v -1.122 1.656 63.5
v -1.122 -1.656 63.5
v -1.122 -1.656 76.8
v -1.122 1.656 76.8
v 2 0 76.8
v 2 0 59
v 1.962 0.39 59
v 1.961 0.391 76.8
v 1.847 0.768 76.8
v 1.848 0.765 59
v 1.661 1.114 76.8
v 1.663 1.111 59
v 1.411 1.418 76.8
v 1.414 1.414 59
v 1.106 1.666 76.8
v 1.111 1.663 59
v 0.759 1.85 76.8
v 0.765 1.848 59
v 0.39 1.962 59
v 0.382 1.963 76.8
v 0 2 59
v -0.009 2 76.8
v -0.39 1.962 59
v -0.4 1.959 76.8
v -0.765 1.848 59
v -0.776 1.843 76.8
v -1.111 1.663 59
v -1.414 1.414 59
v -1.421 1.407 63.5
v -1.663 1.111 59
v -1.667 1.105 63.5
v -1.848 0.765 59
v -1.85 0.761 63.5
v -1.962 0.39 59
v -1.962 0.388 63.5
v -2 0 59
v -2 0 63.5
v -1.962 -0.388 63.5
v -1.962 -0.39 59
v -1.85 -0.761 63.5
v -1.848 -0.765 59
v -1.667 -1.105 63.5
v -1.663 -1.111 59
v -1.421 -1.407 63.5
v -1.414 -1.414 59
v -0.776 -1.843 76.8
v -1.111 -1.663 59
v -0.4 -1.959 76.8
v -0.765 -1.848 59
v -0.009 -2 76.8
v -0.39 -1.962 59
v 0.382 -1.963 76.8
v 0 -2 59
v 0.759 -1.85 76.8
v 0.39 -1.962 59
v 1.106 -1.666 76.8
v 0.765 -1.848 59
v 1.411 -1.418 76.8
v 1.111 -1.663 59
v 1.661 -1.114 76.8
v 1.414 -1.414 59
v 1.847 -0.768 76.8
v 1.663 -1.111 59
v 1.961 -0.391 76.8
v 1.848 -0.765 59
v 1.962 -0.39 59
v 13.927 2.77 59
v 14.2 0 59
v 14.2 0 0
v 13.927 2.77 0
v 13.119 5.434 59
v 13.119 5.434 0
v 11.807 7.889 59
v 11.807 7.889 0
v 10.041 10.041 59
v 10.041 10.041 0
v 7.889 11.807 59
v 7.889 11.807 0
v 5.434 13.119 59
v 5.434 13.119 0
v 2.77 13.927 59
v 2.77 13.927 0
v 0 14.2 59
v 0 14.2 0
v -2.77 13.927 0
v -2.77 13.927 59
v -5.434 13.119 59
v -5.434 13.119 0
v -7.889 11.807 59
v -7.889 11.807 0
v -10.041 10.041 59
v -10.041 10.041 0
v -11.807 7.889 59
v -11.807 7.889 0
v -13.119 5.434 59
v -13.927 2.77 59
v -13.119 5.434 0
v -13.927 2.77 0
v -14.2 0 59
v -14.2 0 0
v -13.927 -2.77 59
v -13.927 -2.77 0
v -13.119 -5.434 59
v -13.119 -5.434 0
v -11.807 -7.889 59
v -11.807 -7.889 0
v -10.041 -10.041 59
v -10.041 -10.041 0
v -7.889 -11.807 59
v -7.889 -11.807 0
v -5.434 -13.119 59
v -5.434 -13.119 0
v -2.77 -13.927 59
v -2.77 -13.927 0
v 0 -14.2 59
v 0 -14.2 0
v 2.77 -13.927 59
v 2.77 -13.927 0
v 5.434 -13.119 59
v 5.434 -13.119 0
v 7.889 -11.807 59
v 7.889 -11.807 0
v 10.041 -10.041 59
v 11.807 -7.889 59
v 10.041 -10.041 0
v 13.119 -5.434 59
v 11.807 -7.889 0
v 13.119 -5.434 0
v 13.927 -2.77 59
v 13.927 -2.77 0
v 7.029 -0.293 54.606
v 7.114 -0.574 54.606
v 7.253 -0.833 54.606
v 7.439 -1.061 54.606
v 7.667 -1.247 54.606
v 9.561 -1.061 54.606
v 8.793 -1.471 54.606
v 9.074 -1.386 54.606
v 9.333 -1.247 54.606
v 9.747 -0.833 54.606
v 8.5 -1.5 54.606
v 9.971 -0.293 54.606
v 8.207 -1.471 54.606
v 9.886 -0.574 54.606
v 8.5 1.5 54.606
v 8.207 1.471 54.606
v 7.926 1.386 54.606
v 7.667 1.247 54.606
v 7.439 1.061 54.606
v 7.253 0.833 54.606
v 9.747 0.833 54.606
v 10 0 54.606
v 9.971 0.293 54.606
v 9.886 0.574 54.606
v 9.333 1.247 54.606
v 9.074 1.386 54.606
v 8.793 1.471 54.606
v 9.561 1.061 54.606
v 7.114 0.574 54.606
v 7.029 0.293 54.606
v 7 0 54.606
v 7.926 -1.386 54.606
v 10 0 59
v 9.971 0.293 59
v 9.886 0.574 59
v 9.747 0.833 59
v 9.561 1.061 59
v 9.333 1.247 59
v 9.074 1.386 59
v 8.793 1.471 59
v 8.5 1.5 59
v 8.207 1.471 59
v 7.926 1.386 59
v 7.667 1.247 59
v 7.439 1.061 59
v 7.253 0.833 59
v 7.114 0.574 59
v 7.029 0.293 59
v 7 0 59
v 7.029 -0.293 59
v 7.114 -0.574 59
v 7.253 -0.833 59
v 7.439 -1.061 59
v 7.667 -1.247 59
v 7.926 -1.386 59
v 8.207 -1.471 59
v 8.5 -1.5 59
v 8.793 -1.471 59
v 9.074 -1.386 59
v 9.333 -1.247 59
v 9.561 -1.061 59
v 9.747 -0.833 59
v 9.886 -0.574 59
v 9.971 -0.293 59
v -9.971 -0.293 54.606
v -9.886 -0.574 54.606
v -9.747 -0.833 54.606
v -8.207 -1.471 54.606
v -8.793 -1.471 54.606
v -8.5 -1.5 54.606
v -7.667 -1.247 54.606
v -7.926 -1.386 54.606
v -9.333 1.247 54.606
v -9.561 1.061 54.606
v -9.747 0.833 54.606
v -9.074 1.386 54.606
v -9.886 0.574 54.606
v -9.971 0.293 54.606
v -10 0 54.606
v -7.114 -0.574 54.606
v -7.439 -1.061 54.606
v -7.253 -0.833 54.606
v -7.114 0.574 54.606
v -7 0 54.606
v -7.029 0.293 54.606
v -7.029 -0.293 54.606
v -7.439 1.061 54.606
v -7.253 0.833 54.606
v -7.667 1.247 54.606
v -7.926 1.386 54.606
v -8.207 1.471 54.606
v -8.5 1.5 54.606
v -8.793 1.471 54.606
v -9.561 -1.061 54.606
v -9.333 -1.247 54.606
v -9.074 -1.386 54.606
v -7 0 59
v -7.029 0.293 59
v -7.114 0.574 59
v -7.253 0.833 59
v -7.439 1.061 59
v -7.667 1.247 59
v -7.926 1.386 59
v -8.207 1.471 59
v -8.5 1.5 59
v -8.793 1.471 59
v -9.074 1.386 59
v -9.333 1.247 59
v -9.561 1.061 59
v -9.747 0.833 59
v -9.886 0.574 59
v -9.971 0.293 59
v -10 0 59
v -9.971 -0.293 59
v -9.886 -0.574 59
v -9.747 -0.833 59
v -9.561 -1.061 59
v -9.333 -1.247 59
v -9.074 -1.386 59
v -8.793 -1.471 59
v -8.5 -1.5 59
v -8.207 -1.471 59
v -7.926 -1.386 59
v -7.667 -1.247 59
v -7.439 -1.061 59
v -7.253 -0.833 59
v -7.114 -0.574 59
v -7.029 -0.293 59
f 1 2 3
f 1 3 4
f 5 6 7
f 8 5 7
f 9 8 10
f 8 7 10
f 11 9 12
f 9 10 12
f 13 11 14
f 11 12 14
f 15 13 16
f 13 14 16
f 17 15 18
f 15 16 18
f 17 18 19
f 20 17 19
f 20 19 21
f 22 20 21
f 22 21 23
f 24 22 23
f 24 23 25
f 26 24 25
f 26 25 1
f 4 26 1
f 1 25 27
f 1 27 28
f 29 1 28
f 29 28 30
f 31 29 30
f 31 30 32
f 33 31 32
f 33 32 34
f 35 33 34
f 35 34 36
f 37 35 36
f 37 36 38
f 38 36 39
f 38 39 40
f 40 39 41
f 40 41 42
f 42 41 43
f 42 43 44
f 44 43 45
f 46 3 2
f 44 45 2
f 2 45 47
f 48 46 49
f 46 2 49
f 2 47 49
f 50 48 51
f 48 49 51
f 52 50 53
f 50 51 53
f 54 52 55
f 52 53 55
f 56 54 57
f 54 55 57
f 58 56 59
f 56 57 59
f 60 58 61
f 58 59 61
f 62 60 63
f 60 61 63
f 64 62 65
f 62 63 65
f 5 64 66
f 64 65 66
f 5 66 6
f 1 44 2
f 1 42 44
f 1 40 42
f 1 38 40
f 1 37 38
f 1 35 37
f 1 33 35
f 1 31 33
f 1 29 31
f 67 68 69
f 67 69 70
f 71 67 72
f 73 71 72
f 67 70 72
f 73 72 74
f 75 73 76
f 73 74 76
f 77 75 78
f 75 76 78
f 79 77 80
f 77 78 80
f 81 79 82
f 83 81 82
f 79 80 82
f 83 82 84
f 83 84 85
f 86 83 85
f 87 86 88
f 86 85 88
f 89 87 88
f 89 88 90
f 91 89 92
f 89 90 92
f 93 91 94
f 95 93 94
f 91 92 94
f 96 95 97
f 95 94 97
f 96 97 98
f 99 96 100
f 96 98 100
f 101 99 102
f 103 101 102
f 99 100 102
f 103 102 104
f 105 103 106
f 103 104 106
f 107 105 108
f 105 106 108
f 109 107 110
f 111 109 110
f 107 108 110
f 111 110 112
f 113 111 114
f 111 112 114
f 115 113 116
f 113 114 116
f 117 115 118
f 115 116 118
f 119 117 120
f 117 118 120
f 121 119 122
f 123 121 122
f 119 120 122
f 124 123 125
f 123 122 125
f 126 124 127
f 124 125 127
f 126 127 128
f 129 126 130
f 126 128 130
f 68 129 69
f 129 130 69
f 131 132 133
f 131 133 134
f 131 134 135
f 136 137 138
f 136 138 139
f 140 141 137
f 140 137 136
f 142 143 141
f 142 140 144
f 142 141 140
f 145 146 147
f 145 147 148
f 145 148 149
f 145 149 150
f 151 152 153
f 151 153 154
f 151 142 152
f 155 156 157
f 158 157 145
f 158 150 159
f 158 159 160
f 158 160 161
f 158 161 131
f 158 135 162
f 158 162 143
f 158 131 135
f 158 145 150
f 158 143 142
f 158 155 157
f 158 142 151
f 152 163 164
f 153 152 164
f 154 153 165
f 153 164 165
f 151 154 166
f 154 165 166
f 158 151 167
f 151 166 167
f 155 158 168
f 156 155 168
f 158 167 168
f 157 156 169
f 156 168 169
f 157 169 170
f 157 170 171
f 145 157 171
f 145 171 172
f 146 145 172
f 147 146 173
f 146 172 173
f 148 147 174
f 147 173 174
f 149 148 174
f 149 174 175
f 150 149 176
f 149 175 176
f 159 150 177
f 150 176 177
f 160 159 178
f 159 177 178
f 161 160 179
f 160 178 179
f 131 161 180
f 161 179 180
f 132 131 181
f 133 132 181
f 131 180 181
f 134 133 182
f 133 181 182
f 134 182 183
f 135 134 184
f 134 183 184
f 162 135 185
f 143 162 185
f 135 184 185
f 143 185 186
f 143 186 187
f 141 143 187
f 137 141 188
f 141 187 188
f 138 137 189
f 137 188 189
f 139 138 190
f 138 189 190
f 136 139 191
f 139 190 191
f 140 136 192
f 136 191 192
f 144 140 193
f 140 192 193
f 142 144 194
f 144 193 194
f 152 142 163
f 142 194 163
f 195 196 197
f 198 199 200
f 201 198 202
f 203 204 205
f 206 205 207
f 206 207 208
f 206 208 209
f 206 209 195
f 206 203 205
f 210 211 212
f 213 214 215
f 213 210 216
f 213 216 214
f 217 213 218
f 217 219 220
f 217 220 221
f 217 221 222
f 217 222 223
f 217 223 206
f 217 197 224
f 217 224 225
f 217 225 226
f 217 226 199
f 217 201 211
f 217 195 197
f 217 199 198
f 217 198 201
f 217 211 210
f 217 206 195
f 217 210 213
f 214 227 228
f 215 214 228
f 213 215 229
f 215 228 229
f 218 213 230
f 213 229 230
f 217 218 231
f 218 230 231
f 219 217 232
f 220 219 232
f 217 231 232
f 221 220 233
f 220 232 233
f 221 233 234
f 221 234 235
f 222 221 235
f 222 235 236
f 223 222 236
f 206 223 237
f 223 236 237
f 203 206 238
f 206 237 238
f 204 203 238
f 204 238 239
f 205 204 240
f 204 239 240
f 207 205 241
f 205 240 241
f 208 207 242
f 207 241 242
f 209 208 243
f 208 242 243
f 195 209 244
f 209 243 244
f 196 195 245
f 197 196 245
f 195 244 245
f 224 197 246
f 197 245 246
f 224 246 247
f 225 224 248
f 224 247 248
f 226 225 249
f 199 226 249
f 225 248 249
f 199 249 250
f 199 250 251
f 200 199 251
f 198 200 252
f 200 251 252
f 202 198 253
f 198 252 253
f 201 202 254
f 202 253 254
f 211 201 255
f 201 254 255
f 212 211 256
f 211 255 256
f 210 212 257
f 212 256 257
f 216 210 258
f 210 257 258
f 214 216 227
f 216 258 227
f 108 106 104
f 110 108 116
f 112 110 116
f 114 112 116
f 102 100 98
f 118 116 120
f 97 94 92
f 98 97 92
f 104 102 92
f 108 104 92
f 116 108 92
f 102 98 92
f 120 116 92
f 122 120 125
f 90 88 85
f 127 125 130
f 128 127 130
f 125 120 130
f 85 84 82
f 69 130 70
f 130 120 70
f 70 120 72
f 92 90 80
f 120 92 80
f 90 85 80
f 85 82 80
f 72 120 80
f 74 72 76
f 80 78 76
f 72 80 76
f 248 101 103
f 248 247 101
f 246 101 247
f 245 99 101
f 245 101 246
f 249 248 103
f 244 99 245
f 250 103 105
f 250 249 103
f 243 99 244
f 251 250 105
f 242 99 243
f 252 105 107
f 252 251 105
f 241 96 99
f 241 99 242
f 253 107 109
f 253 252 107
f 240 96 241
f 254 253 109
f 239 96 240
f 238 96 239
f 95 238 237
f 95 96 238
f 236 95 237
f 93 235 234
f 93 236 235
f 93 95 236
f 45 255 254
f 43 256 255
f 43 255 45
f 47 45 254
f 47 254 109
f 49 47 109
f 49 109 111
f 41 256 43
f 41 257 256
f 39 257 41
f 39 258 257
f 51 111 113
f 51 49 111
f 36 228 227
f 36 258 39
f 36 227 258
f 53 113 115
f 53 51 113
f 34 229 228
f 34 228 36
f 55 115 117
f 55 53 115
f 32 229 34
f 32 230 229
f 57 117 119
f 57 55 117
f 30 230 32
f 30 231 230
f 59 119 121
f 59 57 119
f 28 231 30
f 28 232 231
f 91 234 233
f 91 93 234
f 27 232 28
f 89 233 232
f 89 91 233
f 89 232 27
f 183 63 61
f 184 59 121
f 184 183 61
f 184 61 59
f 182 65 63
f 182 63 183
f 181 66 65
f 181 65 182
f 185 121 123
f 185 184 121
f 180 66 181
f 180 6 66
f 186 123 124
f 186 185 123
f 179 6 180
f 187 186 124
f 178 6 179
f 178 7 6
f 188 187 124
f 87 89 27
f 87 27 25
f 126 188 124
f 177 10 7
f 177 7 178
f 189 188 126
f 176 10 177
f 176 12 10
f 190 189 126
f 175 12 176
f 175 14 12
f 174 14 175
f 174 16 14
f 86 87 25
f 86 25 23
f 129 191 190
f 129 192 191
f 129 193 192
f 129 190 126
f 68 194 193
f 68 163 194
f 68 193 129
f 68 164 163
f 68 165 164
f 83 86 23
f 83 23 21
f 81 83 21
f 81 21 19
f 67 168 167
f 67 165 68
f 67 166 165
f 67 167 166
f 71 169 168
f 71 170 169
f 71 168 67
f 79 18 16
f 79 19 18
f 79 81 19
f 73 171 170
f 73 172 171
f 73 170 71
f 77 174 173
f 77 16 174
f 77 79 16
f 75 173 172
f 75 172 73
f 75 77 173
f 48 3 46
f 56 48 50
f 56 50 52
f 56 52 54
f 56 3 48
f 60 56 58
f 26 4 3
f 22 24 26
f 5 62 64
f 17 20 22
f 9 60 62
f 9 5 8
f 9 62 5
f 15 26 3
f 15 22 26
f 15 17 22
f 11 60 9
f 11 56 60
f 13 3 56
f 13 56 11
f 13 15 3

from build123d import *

# Parameters (mm, degrees)
SKETCH1_R           = 14.2
BOSS_EXTRUDE1_DEPTH = 59
SKETCH2_R           = 2
BOSS_EXTRUDE2_DEPTH = 17.8
SKETCH3_R           = 1.5
CUT_EXTRUDE1_DEPTH  = 4.3942
SKETCH5_W           = 1.529717974
SKETCH5_H           = 4.18122913
CUT_EXTRUDE2_DEPTH  = 13.716


with BuildPart() as part:
    # Sketch1 → Boss-Extrude1 (new body)
    with BuildSketch(Plane.XY):
        Circle(SKETCH1_R)
    extrude(amount=BOSS_EXTRUDE1_DEPTH)

    # Sketch2 → Boss-Extrude2 (add)
    with BuildSketch(Plane.XY.offset(59)):
        Circle(SKETCH2_R)
    extrude(amount=BOSS_EXTRUDE2_DEPTH)

    # Sketch3 → Cut-Extrude1 (cut)
    with BuildSketch(Plane.XY.offset(59)):
        with Locations((-8.5, 0)):
            Circle(SKETCH3_R)
        with Locations((8.5, 0)):
            Circle(SKETCH3_R)
    extrude(amount=-CUT_EXTRUDE1_DEPTH, mode=Mode.SUBTRACT)

    # Sketch5 → Cut-Extrude2 (cut)
    with BuildSketch(Plane.XY.offset(63.5)):
        with Locations((-1.886652168, -0.050990599)):
            Rectangle(SKETCH5_W, SKETCH5_H)
    extrude(amount=CUT_EXTRUDE2_DEPTH, mode=Mode.SUBTRACT)


solid = part.part
